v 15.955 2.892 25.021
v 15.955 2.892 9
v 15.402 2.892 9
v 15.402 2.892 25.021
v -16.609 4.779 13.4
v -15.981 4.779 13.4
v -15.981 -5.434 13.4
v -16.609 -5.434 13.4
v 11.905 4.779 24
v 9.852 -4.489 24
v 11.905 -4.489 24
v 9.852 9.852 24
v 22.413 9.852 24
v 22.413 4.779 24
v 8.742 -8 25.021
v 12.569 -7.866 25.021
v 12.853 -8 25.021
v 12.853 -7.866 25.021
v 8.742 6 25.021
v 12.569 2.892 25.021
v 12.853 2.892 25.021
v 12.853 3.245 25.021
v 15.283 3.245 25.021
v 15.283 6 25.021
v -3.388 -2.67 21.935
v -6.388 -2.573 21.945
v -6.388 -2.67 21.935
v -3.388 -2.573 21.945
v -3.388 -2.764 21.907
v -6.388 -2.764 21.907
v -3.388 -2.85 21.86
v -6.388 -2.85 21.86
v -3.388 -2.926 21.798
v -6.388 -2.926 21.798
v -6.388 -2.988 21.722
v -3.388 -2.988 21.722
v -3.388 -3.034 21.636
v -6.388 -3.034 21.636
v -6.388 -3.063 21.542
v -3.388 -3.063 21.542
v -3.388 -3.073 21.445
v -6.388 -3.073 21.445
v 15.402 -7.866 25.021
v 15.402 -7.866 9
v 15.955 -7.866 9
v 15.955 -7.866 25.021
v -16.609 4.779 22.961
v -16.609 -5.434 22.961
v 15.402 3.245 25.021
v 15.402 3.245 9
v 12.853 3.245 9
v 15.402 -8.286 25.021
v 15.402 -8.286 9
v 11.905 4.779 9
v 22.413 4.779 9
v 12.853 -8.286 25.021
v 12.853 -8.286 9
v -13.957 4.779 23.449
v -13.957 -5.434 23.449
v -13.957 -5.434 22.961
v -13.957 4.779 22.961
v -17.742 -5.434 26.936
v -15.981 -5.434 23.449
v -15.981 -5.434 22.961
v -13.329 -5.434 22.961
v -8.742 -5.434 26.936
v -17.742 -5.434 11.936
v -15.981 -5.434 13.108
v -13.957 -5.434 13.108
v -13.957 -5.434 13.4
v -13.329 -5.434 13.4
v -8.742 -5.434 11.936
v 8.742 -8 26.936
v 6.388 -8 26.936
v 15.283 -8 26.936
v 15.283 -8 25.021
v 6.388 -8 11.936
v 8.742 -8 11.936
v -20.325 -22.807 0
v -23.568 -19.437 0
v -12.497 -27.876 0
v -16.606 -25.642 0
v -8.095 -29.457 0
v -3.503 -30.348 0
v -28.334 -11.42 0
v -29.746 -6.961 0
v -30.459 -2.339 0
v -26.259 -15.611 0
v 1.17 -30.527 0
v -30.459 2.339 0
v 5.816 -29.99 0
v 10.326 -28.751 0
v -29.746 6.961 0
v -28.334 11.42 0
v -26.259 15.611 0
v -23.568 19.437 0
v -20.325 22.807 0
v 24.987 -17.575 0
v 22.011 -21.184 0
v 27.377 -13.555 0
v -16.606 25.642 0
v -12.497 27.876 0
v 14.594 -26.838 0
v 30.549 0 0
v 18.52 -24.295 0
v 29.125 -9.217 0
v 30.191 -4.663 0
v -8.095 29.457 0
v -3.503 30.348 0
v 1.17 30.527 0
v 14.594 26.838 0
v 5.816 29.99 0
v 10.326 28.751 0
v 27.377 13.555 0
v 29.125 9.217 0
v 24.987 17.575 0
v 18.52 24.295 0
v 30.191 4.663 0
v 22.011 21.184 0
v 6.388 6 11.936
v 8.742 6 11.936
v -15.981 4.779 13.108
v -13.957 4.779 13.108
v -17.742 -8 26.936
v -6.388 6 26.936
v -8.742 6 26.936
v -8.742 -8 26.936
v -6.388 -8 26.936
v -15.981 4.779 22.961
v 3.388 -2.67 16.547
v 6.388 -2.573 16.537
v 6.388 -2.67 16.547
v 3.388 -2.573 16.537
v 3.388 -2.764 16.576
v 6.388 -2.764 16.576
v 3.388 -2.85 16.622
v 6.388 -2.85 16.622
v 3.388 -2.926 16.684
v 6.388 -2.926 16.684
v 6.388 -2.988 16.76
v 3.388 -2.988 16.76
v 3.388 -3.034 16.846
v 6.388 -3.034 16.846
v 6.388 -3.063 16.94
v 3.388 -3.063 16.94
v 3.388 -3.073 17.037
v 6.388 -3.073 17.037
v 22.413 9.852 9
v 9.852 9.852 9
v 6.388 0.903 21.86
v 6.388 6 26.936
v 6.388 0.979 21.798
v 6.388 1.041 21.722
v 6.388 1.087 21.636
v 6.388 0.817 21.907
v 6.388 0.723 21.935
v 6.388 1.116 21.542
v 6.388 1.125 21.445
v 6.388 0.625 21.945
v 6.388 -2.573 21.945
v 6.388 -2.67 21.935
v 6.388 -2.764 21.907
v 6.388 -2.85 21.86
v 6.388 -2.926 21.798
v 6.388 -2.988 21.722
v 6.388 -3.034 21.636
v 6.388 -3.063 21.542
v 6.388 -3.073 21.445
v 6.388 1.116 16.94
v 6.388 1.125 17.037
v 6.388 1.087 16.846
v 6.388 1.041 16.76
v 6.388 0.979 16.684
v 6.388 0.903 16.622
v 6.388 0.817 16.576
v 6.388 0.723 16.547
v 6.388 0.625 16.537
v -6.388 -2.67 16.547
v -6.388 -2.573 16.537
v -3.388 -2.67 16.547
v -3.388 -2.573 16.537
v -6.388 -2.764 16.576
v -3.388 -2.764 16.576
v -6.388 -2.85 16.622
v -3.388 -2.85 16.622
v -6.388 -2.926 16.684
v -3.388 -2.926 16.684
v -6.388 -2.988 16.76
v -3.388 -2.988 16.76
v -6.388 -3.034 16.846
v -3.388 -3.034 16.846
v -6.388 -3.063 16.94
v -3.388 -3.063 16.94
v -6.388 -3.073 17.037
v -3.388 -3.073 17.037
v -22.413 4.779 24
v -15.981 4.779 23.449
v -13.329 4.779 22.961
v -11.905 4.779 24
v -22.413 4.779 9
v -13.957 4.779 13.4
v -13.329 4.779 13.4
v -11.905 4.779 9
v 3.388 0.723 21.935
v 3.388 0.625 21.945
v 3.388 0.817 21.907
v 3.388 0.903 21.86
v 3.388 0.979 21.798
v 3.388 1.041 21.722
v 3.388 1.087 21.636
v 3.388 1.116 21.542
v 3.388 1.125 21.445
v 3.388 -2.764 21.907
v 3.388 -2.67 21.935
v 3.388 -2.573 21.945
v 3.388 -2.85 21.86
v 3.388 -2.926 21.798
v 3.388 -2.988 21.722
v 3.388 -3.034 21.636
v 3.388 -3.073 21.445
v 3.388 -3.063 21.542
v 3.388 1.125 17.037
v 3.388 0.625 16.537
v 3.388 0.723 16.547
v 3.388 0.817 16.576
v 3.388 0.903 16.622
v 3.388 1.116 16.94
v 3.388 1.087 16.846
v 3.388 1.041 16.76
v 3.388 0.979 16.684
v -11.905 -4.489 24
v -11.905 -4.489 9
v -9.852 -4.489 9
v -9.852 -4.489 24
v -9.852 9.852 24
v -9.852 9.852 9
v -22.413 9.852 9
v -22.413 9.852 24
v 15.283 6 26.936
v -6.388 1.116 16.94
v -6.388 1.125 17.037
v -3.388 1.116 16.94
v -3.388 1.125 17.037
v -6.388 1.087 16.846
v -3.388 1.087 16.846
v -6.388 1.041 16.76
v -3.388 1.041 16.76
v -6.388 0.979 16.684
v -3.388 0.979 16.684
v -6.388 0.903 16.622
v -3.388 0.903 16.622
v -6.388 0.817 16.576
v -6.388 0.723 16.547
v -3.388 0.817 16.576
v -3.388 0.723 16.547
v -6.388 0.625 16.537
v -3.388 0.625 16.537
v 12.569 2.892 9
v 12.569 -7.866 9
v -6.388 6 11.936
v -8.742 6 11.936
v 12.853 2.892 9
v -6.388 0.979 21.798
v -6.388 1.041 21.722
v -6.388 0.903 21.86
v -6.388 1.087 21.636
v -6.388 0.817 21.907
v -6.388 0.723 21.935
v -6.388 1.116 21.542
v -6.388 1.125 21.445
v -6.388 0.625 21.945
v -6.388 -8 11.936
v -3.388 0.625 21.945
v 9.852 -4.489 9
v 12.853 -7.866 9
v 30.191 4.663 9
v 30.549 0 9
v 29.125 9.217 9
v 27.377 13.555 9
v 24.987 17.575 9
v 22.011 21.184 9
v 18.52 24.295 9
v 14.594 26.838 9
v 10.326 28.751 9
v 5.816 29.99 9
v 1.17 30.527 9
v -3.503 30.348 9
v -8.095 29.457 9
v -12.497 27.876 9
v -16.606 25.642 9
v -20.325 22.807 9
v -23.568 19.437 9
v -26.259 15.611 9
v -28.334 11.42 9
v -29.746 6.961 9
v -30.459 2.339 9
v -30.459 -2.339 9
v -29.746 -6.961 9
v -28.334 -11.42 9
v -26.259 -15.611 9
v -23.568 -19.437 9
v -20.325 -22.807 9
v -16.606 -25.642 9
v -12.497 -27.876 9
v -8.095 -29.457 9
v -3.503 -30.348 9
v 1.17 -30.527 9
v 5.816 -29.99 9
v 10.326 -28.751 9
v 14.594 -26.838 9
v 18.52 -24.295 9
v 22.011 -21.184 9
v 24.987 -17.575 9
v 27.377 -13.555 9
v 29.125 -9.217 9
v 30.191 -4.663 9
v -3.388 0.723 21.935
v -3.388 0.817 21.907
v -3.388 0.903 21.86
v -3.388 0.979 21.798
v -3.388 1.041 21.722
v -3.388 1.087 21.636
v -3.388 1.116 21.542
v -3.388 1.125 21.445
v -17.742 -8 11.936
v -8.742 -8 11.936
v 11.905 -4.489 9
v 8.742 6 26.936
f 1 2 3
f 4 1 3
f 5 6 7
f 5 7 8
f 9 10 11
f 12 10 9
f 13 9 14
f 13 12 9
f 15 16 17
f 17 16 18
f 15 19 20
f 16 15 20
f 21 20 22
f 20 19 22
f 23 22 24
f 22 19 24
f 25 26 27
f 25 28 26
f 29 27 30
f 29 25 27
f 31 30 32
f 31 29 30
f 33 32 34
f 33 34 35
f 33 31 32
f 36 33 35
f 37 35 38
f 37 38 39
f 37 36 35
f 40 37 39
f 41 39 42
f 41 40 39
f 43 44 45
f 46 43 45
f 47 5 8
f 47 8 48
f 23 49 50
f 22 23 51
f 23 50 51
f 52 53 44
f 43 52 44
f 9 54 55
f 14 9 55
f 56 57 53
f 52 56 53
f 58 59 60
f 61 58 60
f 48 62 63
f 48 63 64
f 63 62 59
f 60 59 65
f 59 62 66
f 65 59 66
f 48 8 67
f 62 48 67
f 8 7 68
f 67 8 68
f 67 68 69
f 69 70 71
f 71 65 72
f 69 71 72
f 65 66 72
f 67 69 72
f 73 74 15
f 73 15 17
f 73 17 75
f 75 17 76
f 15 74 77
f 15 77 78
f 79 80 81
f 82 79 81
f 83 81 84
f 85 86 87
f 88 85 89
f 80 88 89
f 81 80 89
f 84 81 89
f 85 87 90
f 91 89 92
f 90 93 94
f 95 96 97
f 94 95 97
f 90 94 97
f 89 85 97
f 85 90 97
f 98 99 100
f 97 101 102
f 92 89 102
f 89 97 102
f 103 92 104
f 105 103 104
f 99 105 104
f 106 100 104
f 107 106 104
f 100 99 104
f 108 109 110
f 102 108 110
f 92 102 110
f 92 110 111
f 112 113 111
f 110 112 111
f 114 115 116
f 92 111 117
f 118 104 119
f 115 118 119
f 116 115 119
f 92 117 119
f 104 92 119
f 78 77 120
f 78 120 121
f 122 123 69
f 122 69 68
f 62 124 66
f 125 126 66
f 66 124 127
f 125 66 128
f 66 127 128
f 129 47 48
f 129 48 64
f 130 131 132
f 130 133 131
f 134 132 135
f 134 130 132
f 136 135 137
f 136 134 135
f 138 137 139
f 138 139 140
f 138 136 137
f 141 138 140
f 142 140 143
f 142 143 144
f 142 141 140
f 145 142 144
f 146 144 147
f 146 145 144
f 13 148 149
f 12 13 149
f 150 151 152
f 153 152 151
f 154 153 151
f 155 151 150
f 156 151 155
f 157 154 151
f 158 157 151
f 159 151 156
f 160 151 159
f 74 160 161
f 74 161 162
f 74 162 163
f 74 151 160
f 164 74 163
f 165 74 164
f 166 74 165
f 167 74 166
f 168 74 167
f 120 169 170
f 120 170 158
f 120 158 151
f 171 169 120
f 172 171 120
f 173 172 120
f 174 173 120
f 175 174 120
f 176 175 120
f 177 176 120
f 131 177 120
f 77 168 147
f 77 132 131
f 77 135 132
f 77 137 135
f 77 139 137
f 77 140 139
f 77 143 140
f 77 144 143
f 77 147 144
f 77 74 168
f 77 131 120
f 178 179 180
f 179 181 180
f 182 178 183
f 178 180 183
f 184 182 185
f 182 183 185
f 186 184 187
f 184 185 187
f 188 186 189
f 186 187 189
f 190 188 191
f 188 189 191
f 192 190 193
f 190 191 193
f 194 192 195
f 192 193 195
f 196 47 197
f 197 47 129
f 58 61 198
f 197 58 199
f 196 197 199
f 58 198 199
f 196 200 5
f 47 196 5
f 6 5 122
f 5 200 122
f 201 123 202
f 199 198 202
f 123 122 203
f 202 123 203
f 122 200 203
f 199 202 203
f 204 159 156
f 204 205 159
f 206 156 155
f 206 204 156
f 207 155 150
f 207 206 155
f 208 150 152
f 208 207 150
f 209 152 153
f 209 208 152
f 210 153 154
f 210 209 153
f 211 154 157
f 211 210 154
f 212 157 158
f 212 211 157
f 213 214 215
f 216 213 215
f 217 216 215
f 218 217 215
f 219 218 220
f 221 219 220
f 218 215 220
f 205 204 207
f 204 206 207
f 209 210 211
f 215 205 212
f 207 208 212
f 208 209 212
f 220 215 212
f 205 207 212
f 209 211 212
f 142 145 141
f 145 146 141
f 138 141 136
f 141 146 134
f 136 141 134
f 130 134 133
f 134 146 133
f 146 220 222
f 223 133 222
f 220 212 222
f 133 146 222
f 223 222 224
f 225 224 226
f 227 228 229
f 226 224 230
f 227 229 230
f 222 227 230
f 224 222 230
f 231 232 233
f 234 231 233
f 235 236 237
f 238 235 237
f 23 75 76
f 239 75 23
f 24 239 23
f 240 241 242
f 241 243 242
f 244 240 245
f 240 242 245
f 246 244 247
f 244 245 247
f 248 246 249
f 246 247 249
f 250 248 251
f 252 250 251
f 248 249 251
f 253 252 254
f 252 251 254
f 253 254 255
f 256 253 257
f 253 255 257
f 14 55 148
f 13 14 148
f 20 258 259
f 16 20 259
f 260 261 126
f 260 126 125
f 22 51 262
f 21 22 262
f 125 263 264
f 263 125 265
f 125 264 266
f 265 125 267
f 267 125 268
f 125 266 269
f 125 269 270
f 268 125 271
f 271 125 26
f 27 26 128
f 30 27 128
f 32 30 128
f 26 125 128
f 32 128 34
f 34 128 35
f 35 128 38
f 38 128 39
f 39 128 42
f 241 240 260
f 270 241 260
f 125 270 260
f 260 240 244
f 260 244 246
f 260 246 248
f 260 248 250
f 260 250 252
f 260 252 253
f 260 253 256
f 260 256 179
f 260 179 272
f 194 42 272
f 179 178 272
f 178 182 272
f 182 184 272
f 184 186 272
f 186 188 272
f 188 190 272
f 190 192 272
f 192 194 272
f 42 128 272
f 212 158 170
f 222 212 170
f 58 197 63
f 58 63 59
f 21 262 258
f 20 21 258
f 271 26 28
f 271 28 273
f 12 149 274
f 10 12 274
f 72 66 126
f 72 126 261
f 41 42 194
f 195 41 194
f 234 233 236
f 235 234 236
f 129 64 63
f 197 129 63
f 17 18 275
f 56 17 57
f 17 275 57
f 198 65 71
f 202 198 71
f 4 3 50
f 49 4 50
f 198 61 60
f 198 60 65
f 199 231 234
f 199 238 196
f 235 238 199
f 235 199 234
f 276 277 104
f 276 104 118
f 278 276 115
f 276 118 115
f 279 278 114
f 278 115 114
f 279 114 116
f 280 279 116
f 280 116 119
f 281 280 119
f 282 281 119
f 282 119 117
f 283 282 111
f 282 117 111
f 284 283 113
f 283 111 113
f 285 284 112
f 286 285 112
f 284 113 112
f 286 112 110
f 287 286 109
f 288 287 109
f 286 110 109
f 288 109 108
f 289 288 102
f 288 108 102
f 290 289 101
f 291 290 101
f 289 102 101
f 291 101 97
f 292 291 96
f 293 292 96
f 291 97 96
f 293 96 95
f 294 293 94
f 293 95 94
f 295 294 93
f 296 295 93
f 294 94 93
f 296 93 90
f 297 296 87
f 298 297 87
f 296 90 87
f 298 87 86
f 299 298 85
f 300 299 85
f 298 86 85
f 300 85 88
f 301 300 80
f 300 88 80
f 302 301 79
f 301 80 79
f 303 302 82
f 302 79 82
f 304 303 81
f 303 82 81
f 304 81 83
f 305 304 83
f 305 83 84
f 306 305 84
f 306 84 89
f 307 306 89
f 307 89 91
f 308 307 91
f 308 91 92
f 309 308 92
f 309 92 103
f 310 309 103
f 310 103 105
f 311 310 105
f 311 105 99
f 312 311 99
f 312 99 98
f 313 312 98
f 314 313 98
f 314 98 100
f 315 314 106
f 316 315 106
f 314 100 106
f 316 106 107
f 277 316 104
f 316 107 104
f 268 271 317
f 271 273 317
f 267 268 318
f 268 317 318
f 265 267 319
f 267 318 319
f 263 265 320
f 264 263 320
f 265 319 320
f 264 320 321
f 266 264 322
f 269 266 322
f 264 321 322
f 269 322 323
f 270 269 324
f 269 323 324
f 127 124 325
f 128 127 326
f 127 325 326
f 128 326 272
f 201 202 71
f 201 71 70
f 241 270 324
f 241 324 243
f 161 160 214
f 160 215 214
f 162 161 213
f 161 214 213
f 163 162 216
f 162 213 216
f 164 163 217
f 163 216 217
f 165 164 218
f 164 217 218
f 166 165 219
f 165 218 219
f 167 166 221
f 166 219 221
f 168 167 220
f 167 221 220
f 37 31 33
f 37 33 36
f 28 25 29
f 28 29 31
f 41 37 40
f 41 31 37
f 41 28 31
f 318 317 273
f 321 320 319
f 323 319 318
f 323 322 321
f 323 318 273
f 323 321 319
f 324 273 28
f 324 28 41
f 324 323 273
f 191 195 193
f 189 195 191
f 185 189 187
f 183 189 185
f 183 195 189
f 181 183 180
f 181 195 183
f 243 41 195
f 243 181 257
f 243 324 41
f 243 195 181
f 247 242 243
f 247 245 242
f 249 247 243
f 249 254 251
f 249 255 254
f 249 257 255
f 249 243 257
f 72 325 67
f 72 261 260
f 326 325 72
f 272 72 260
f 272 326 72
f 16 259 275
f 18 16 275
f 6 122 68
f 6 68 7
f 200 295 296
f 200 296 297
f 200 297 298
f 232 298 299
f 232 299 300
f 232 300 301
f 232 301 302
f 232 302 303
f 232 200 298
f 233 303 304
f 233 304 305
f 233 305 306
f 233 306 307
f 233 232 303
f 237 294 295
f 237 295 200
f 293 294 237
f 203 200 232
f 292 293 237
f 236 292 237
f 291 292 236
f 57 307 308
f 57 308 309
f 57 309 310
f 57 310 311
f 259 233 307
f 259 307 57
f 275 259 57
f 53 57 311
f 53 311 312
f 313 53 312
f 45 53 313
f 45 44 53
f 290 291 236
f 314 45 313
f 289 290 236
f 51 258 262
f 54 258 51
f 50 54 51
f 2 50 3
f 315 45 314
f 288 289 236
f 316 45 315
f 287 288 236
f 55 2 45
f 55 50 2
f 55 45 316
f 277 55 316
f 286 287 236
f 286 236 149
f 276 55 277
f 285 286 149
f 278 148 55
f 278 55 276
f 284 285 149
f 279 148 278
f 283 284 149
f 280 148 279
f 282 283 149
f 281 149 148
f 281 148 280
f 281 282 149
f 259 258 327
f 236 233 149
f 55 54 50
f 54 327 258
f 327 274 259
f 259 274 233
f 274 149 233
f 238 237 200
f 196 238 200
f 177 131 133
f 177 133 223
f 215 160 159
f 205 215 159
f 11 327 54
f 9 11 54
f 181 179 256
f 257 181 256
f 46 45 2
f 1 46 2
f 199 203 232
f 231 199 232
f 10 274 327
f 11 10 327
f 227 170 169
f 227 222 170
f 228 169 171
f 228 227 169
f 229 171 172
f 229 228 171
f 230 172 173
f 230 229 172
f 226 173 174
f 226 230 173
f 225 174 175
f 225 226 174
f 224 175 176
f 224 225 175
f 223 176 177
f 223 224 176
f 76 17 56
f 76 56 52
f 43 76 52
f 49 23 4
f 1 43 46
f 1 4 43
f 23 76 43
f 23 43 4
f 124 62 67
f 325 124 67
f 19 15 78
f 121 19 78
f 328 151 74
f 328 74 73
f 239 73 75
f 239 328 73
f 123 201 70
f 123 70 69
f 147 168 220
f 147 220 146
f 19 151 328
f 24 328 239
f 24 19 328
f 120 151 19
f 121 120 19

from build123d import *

# Parameters (mm, degrees)
SKETCH_1_R             = 30.549115646
EXTRUDE_1_DEPTH        = 9
EXTRUDE_2_DEPTH        = 15
SKETCH_8_W             = 2.353970865
SKETCH_8_H             = 15
EXTRUDE_3_DEPTH        = 8
EXTRUDE_3_2_DEPTH      = 8
SKETCH_12_W            = 2.353970865
SKETCH_12_H            = 15
EXTRUDE_5_DEPTH        = 6
EXTRUDE_START          = -8.741924
SKETCH_14_W            = 15
SKETCH_14_H            = 2.566345669
EXTRUDE_7_DEPTH        = 9
SKETCH_15_W            = 6.541100851
SKETCH_15_H            = 1.915380037
EXTRUDE_8_DEPTH        = 6
SKETCH_15_2_W          = 6.541100851
SKETCH_15_2_H          = 1.915380037
EXTRUDE_9_DEPTH        = 8
EXTRUDE_10_DEPTH       = 16.020510359
EXTRUDE_11_DEPTH       = 12.778725016
SKETCH_19_W            = 5.407207082
SKETCH_19_H            = 4.197700235
EXTRUDE_12_DEPTH       = 3
FILLET_1_R             = 0.5
FILLET_1_OF_MIRROR_4_R = 0.5


with BuildPart() as part:
    # 草图1 → 凸台-拉伸1 (new body)
    with BuildSketch(Plane.XY):
        Circle(SKETCH_1_R)
    extrude(amount=EXTRUDE_1_DEPTH)

    # 草图3 → 凸台-拉伸2 (add)
    with BuildSketch(Plane.XY.offset(9)):
        Polygon((-22.413460509, 4.778725016), (-11.904585252, 4.778725016), (-11.904585252, -4.489323984), (-9.852070554, -4.489323984), (-9.852070554, 7.306952327), (-9.852070554, 9.852070554), (-22.413460509, 9.852070554), align=None)
        Polygon((22.413460509, 9.852070554), (9.852070554, 9.852070554), (9.852070554, 7.306952327), (9.852070554, -4.489323984), (11.904585252, -4.489323984), (11.904585252, 4.778725016), (22.413460509, 4.778725016), align=None)
    extrude(amount=EXTRUDE_2_DEPTH)



with BuildPart() as body_2:
    # 草图8 → 凸台-拉伸3 (new body)
    with BuildSketch(Plane(origin=(0, 0, 0), x_dir=(1, 0, 0), z_dir=(0, 1, 0))):
        with Locations((-7.564938163, -19.435890396)):
            Rectangle(SKETCH_8_W, SKETCH_8_H)
    extrude(amount=-EXTRUDE_3_DEPTH)



with BuildPart() as body_3:
    # 草图8 → Extrude 3 2 (new body)
    with BuildSketch(Plane(origin=(0, 0, 0), x_dir=(1, 0, 0), z_dir=(0, 1, 0))):
        with Locations((7.564938163, -19.435890396)):
            Rectangle(SKETCH_8_W, SKETCH_8_H)
    extrude(amount=-EXTRUDE_3_2_DEPTH)


with BuildPart() as body_2_1:
    add(body_2.part)

    add(body_3.part)  # 凸台-拉伸5 merges body 3
    # 草图12 → 凸台-拉伸5 (add)
    with BuildSketch(Plane(origin=(0, 0, 0), x_dir=(1, 0, 0), z_dir=(0, 1, 0))):
        with Locations((-7.564938163, -19.435890396)):
            Rectangle(SKETCH_12_W, SKETCH_12_H)
        with Locations((7.564938163, -19.435890396)):
            Rectangle(SKETCH_12_W, SKETCH_12_H)
    extrude(amount=EXTRUDE_5_DEPTH)


with BuildPart() as extrude_7_tool:
    # 草图14 → 凸台-拉伸7 (new body)
    with BuildSketch(Plane(origin=(0, 0, 0), x_dir=(0, 0, -1), z_dir=(1, 0, 0)).offset(EXTRUDE_START)):
        with Locations((-19.435890396, -6.716827165)):
            Rectangle(SKETCH_14_W, SKETCH_14_H)
    extrude(amount=-EXTRUDE_7_DEPTH)


with BuildPart() as body_2_2:
    add(body_2_1.part)


with BuildPart() as body_2_3:
    # 凸台-拉伸7: joined with extrude_7_tool
    add(body_2_2.part.fuse(extrude_7_tool.part, tol=0.00001))

    # 草图15 → 凸台-拉伸8 (add)
    with BuildSketch(Plane(origin=(0, 0, 0), x_dir=(1, 0, 0), z_dir=(0, 1, 0))):
        with Locations((12.012474021, -25.978200378)):
            Rectangle(SKETCH_15_W, SKETCH_15_H)
    extrude(amount=EXTRUDE_8_DEPTH)

    # 草图15<2> → 凸台-拉伸9 (add)
    with BuildSketch(Plane(origin=(0, 0, 0), x_dir=(1, 0, 0), z_dir=(0, 1, 0))):
        with Locations((12.012474021, -25.978200378)):
            Rectangle(SKETCH_15_2_W, SKETCH_15_2_H)
    extrude(amount=-EXTRUDE_9_DEPTH)


with BuildPart() as part_1:
    add(part.part)

    add(body_2_3.part)  # 凸台-拉伸10 merges body 2
    # 草图16 → 凸台-拉伸10 (add)
    with BuildSketch(Plane.XY.offset(9)):
        Polygon((15.402096143, -7.866023052), (15.954530634, -7.866023052), (15.954530634, 2.891816022), (15.402096143, 2.891816022), (15.402096143, 3.244620079), (12.852605538, 3.244620079), (12.852605538, 2.891816022), (12.56859722, 2.891816022), (12.56859722, -7.866023052), (12.852605538, -7.866023052), (12.852605538, -8.286124494), (15.402096143, -8.286124494), align=None)
    extrude(amount=EXTRUDE_10_DEPTH)

    # 草图18 → 凸台-拉伸11 (add)
    with BuildSketch(Plane.XZ.offset(-4.778725016)):
        Polygon((-15.980879444, 13.400073381), (-16.608948942, 13.400073381), (-16.608948942, 22.960686847), (-15.980879444, 22.960686847), (-15.980879444, 23.449185345), (-13.957099951, 23.449185345), (-13.957099951, 22.960686847), (-13.329030453, 22.960686847), (-13.329030453, 13.400073381), (-13.957099951, 13.400073381), (-13.957099951, 13.108195893), (-15.980879444, 13.108195893), align=None)
    extrude(amount=EXTRUDE_11_DEPTH)

    # 草图19 → 凸台-拉伸12 (add)
    with BuildSketch(Plane(origin=(-6.38795273, 0, 0), x_dir=(0, 0, -1), z_dir=(1, 0, 0))):
        with Locations((-19.241101822, -0.973659034)):
            Rectangle(SKETCH_19_W, SKETCH_19_H)
    extrude_12 = extrude(amount=EXTRUDE_12_DEPTH)

    # 圆角1
    fillet_1_edges = [part_1.edges().sort_by_distance(p)[0] for p in [
        (-4.88795273, 1.125191084, 21.944705363),
        (-4.88795273, -3.072509151, 21.944705363),
        (-4.88795273, -3.072509151, 16.537498281),
        (-4.88795273, 1.125191084, 16.537498281),
    ]]
    fillet(fillet_1_edges, radius=FILLET_1_R)

    # 镜向4: 凸台-拉伸12 across plane
    add(extrude_12.mirror(Plane(origin=(0, 0, 0), x_dir=(0, 0, 1), z_dir=(1, 0, 0))))

    # 圆角1 of 镜向4
    fillet_1_of_mirror_4_edges = [part_1.edges().sort_by_distance(p)[0] for p in [
        (4.88795273, 1.125191084, 21.944705363),
        (4.88795273, -3.072509151, 21.944705363),
        (4.88795273, -3.072509151, 16.537498281),
        (4.88795273, 1.125191084, 16.537498281),
    ]]
    fillet(fillet_1_of_mirror_4_edges, radius=FILLET_1_OF_MIRROR_4_R)


solid = part_1.part
